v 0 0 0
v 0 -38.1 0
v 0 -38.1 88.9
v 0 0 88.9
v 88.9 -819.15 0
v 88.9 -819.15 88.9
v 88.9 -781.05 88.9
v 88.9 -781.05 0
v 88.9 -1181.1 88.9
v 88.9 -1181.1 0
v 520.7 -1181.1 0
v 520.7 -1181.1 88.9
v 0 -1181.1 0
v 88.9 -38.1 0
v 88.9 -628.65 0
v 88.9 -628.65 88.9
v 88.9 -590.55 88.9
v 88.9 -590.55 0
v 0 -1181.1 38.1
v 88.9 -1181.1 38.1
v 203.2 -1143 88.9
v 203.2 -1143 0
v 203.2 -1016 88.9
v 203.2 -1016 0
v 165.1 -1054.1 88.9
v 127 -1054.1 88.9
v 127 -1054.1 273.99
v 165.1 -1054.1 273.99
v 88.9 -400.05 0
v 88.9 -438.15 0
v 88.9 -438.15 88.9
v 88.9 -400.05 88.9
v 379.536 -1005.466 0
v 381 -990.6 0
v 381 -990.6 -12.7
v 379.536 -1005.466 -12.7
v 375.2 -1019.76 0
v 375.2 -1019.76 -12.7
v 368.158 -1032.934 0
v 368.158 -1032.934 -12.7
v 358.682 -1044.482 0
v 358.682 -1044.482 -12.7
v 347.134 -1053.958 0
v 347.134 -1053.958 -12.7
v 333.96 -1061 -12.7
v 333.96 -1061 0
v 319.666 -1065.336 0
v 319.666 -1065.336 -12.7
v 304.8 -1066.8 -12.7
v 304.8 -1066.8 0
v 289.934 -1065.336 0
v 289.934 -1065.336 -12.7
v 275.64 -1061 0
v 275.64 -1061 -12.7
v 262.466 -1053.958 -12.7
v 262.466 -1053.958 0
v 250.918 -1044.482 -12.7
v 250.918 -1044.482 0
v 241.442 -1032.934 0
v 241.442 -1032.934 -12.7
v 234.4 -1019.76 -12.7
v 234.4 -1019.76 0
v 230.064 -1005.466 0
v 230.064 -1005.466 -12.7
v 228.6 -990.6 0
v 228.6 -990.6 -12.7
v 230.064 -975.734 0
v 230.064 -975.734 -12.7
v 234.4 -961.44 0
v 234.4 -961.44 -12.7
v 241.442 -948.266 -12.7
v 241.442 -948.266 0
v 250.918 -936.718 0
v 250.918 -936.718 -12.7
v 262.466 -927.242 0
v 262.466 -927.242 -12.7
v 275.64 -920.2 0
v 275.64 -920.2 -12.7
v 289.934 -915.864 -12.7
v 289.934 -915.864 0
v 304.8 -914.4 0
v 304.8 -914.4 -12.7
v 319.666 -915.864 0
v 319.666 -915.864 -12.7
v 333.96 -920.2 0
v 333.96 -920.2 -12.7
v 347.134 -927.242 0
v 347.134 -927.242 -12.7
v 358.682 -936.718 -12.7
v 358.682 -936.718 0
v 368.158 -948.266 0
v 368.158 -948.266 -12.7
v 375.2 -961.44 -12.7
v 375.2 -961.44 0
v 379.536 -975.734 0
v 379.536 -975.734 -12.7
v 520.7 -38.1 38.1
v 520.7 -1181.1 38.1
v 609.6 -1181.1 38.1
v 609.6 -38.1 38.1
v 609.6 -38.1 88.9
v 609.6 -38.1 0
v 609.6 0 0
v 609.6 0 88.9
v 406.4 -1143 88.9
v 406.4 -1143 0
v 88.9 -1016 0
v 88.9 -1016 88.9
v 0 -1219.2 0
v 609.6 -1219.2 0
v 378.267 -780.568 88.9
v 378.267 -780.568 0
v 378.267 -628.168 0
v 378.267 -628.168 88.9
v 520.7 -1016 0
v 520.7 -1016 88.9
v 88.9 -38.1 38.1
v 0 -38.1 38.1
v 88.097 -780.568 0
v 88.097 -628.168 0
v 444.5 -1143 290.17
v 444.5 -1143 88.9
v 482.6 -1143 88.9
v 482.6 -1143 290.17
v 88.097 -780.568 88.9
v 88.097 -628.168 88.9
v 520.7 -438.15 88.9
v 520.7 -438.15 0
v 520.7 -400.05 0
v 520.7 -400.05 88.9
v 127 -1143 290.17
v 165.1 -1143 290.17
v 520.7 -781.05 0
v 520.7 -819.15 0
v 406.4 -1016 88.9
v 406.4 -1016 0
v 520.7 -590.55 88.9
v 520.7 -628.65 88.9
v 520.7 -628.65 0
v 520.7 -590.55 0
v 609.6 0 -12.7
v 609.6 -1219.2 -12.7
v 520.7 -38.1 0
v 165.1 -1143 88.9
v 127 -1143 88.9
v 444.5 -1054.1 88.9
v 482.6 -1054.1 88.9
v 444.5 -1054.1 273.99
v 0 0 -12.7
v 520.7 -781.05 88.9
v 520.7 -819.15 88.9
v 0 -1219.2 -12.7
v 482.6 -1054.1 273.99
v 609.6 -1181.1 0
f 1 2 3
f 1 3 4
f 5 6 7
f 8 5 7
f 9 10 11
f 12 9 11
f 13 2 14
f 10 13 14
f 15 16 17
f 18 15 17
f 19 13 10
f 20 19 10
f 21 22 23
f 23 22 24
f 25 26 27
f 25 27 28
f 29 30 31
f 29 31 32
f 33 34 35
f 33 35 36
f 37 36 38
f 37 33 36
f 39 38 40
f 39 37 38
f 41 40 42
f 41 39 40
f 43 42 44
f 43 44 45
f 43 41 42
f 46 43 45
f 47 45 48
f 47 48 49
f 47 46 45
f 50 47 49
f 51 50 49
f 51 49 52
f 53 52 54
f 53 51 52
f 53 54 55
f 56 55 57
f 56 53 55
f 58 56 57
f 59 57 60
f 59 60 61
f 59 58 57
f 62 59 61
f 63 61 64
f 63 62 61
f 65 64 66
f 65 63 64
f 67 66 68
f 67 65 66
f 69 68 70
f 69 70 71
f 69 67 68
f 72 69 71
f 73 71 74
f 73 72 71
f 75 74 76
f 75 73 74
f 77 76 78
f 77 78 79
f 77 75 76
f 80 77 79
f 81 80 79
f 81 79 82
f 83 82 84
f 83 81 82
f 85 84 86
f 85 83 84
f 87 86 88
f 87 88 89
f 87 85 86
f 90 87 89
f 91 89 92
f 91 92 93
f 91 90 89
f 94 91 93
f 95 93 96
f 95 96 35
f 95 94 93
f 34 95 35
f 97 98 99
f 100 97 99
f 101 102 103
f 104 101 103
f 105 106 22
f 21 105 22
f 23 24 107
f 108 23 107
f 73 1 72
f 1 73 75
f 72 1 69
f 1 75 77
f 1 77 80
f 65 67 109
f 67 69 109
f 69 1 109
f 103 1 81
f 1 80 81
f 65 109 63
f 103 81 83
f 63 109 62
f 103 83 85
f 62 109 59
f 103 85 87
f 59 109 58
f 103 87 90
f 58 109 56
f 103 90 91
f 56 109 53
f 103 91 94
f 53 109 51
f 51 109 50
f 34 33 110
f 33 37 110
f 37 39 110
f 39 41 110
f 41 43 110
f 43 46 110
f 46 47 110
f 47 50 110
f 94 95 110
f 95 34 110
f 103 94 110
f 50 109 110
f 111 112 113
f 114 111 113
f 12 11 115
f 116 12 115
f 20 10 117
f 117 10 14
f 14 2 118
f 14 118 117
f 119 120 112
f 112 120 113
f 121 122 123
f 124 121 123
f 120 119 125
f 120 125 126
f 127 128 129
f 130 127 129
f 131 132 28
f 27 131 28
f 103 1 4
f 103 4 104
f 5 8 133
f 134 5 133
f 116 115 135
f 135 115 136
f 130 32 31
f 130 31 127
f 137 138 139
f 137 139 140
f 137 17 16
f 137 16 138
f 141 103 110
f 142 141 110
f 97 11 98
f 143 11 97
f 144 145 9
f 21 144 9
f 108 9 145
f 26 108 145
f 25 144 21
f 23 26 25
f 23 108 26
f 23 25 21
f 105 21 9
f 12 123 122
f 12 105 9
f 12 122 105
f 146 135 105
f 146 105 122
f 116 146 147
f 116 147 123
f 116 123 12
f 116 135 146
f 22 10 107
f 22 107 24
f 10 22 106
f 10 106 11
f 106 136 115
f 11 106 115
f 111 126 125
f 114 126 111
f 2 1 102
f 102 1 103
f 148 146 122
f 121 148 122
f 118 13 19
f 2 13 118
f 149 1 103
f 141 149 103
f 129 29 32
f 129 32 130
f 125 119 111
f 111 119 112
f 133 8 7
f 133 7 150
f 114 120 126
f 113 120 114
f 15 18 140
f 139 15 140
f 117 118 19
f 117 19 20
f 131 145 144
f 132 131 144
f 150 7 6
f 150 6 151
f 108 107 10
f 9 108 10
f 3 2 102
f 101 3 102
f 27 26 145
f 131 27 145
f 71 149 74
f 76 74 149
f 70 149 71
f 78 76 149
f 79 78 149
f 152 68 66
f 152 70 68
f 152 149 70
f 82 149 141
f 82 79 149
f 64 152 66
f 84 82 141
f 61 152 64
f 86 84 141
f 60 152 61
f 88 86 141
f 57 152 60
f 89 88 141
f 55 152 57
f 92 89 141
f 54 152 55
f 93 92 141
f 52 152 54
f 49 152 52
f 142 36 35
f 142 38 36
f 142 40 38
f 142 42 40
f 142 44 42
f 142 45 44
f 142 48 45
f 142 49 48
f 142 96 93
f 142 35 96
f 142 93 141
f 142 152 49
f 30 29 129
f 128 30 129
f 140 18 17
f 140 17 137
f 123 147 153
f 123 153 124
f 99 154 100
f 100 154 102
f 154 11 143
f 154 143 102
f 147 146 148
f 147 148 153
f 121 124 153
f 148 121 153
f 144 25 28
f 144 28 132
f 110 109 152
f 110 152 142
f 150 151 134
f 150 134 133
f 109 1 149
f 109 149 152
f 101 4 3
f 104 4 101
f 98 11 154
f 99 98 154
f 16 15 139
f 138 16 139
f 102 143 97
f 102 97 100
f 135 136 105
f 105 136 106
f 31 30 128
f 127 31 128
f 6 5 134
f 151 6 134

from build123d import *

# Parameters (mm, degrees)
F0_W      = 609.6
F0_H      = 38.1
F1_DEPTH  = 88.9
F2_W      = 88.9
F2_H      = 1143
F3_DEPTH  = 38.1
F4_W      = 38.1
F4_H      = 88.9
F5_DEPTH  = 88.9
F6_W      = 38.1
F6_H      = 88.9
F7_DEPTH  = 290.1696
F9_DEPTH  = 482.601
F10_W     = 609.6
F10_H     = 1219.2
F10_R     = 76.2
F11_DEPTH = 12.7
F12_W     = 431.8
F12_H     = 38.1
F13_DEPTH = 88.9
F14_W     = 290.1696
F14_H     = 152.4
F15_DEPTH = 88.9


with BuildPart() as f1:
    # F0 (on Top) → F1 (new body)
    with BuildSketch(Plane.XY):
        with Locations((304.8, -19.05)):
            Rectangle(F0_W, F0_H)
    extrude(amount=F1_DEPTH)


with BuildPart() as f3:
    # F2 (on Top) → F3 (new body)
    with BuildSketch(Plane.XY):
        with Locations((44.45, -609.6)):
            Rectangle(F2_W, F2_H)
        with Locations((565.15, -609.6)):
            Rectangle(F2_W, F2_H)
    extrude(amount=F3_DEPTH)


with BuildPart() as f5:
    # F4 (on Top) → F5 (new body)
    with BuildSketch(Plane.XY):
        Polygon((482.6, -1054.1), (520.7, -1054.1), (520.7, -1016), (406.4, -1016), (406.4, -1054.1), (444.5, -1054.1), align=None)
        Polygon((88.9, -1143), (88.9, -1181.1), (520.7, -1181.1), (520.7, -1143), (482.6, -1143), (444.5, -1143), (406.4, -1143), (304.8, -1143), (203.2, -1143), (165.1, -1143), (127, -1143), align=None)
        Polygon((88.9, -1016), (88.9, -1054.1), (127, -1054.1), (165.1, -1054.1), (203.2, -1054.1), (203.2, -1016), align=None)
        with Locations((107.95, -1098.55)):
            Rectangle(F4_W, F4_H)
        with Locations((184.15, -1098.55)):
            Rectangle(F4_W, F4_H)
        with Locations((425.45, -1098.55)):
            Rectangle(F4_W, F4_H)
        with Locations((501.65, -1098.55)):
            Rectangle(F4_W, F4_H)
    extrude(amount=F5_DEPTH)

    # F6 (on face) → F7 (join)
    with BuildSketch(Plane(origin=(0, 0, 0), x_dir=(1, 0, 0), z_dir=(0, 0, -1))):
        with Locations((463.55, 1098.55)):
            Rectangle(F6_W, F6_H)
        with Locations((146.05, 1098.55)):
            Rectangle(F6_W, F6_H)
    extrude(amount=-F7_DEPTH)

    # F8 (on face) → F9 (cut, through all)
    with BuildSketch(Plane.YZ.offset(482.6)):
        Polygon((-1054.1, 273.9898), (-1054.1, 290.1696), (-1143, 290.1696), align=None)
    extrude(amount=-F9_DEPTH, mode=Mode.SUBTRACT)


with BuildPart() as f11:
    # F10 (on face) → F11 (new body)
    with BuildSketch(Plane(origin=(0, 0, 0), x_dir=(1, 0, 0), z_dir=(0, 0, -1))):
        with Locations((304.8, 609.6)):
            Rectangle(F10_W, F10_H)
        with Locations((304.8, 990.6)):
            Circle(F10_R, mode=Mode.SUBTRACT)
    extrude(amount=F11_DEPTH)


with BuildPart() as f13:
    # F12 (on face) → F13 (new body)
    with BuildSketch(Plane.XY):
        with Locations((304.8, -609.6)):
            Rectangle(F12_W, F12_H)
        with Locations((304.8, -419.1)):
            Rectangle(F12_W, F12_H)
        with Locations((304.8, -800.1)):
            Rectangle(F12_W, F12_H)
    extrude(amount=F13_DEPTH)


with BuildPart() as f15:
    # F14 (on face) → F15 (new body)
    with BuildSketch(Plane.XY):
        with Locations((233.182134, -704.367765)):
            Rectangle(F14_W, F14_H)
    extrude(amount=F15_DEPTH)


solid = Compound([f1.part, f3.part, f5.part, f11.part, f13.part, f15.part])
